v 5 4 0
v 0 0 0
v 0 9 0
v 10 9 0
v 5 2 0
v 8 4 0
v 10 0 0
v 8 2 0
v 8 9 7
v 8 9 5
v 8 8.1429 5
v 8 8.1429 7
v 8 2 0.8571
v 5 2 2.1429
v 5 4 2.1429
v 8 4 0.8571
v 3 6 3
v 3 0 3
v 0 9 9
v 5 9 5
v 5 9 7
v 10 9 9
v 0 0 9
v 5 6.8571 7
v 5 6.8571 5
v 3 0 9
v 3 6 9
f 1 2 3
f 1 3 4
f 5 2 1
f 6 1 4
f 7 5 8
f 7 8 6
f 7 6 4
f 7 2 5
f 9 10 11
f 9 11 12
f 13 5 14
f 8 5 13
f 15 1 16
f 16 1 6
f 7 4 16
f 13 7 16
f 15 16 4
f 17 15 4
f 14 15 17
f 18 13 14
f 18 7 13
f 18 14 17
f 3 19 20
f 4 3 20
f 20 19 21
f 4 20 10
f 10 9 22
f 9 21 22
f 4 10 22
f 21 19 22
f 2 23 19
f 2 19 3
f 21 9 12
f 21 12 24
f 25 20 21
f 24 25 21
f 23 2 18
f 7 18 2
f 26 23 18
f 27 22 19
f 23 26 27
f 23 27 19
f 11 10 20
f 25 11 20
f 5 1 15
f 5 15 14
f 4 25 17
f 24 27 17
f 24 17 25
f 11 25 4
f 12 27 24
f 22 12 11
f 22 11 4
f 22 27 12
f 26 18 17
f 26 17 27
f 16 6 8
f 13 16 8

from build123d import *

# Parameters (mm, degrees)
F1_DEPTH = 9
F3_DEPTH = 9
F4_W     = 3
F4_H     = 2
F5_DEPTH = 9.001
F6_W     = 3
F6_H     = 2
F7_DEPTH = 9.001


with BuildPart() as f1:
    # F0 (on Front) → F1 (new body)
    with BuildSketch(Plane.XZ):
        Polygon((3, 9), (0, 9), (0, 0), (10, 0), (3, 3), align=None)
    extrude(amount=-F1_DEPTH)

    # F2 (on face) → F3 (join)
    with BuildSketch(Plane.XY.offset(9)):
        Polygon((0, 9), (0, 0), (3, 0), (3, 6), (3, 9), align=None)
        Polygon((3, 9), (3, 6), (10, 9), align=None)
    extrude(amount=-F3_DEPTH)

    # F4 (on face) → F5 (cut, through all)
    with BuildSketch(Plane(origin=(0, 9, 0), x_dir=(-1, 0, 0), z_dir=(0, 1, 0))):
        with Locations((-6.5, 6)):
            Rectangle(F4_W, F4_H)
    extrude(amount=-F5_DEPTH, mode=Mode.SUBTRACT)

    # F6 (on face) → F7 (cut, through all)
    with BuildSketch(Plane(origin=(0, 0, 0), x_dir=(1, 0, 0), z_dir=(0, 0, -1))):
        with Locations((6.5, -3)):
            Rectangle(F6_W, F6_H)
    extrude(amount=-F7_DEPTH, mode=Mode.SUBTRACT)


solid = f1.part
